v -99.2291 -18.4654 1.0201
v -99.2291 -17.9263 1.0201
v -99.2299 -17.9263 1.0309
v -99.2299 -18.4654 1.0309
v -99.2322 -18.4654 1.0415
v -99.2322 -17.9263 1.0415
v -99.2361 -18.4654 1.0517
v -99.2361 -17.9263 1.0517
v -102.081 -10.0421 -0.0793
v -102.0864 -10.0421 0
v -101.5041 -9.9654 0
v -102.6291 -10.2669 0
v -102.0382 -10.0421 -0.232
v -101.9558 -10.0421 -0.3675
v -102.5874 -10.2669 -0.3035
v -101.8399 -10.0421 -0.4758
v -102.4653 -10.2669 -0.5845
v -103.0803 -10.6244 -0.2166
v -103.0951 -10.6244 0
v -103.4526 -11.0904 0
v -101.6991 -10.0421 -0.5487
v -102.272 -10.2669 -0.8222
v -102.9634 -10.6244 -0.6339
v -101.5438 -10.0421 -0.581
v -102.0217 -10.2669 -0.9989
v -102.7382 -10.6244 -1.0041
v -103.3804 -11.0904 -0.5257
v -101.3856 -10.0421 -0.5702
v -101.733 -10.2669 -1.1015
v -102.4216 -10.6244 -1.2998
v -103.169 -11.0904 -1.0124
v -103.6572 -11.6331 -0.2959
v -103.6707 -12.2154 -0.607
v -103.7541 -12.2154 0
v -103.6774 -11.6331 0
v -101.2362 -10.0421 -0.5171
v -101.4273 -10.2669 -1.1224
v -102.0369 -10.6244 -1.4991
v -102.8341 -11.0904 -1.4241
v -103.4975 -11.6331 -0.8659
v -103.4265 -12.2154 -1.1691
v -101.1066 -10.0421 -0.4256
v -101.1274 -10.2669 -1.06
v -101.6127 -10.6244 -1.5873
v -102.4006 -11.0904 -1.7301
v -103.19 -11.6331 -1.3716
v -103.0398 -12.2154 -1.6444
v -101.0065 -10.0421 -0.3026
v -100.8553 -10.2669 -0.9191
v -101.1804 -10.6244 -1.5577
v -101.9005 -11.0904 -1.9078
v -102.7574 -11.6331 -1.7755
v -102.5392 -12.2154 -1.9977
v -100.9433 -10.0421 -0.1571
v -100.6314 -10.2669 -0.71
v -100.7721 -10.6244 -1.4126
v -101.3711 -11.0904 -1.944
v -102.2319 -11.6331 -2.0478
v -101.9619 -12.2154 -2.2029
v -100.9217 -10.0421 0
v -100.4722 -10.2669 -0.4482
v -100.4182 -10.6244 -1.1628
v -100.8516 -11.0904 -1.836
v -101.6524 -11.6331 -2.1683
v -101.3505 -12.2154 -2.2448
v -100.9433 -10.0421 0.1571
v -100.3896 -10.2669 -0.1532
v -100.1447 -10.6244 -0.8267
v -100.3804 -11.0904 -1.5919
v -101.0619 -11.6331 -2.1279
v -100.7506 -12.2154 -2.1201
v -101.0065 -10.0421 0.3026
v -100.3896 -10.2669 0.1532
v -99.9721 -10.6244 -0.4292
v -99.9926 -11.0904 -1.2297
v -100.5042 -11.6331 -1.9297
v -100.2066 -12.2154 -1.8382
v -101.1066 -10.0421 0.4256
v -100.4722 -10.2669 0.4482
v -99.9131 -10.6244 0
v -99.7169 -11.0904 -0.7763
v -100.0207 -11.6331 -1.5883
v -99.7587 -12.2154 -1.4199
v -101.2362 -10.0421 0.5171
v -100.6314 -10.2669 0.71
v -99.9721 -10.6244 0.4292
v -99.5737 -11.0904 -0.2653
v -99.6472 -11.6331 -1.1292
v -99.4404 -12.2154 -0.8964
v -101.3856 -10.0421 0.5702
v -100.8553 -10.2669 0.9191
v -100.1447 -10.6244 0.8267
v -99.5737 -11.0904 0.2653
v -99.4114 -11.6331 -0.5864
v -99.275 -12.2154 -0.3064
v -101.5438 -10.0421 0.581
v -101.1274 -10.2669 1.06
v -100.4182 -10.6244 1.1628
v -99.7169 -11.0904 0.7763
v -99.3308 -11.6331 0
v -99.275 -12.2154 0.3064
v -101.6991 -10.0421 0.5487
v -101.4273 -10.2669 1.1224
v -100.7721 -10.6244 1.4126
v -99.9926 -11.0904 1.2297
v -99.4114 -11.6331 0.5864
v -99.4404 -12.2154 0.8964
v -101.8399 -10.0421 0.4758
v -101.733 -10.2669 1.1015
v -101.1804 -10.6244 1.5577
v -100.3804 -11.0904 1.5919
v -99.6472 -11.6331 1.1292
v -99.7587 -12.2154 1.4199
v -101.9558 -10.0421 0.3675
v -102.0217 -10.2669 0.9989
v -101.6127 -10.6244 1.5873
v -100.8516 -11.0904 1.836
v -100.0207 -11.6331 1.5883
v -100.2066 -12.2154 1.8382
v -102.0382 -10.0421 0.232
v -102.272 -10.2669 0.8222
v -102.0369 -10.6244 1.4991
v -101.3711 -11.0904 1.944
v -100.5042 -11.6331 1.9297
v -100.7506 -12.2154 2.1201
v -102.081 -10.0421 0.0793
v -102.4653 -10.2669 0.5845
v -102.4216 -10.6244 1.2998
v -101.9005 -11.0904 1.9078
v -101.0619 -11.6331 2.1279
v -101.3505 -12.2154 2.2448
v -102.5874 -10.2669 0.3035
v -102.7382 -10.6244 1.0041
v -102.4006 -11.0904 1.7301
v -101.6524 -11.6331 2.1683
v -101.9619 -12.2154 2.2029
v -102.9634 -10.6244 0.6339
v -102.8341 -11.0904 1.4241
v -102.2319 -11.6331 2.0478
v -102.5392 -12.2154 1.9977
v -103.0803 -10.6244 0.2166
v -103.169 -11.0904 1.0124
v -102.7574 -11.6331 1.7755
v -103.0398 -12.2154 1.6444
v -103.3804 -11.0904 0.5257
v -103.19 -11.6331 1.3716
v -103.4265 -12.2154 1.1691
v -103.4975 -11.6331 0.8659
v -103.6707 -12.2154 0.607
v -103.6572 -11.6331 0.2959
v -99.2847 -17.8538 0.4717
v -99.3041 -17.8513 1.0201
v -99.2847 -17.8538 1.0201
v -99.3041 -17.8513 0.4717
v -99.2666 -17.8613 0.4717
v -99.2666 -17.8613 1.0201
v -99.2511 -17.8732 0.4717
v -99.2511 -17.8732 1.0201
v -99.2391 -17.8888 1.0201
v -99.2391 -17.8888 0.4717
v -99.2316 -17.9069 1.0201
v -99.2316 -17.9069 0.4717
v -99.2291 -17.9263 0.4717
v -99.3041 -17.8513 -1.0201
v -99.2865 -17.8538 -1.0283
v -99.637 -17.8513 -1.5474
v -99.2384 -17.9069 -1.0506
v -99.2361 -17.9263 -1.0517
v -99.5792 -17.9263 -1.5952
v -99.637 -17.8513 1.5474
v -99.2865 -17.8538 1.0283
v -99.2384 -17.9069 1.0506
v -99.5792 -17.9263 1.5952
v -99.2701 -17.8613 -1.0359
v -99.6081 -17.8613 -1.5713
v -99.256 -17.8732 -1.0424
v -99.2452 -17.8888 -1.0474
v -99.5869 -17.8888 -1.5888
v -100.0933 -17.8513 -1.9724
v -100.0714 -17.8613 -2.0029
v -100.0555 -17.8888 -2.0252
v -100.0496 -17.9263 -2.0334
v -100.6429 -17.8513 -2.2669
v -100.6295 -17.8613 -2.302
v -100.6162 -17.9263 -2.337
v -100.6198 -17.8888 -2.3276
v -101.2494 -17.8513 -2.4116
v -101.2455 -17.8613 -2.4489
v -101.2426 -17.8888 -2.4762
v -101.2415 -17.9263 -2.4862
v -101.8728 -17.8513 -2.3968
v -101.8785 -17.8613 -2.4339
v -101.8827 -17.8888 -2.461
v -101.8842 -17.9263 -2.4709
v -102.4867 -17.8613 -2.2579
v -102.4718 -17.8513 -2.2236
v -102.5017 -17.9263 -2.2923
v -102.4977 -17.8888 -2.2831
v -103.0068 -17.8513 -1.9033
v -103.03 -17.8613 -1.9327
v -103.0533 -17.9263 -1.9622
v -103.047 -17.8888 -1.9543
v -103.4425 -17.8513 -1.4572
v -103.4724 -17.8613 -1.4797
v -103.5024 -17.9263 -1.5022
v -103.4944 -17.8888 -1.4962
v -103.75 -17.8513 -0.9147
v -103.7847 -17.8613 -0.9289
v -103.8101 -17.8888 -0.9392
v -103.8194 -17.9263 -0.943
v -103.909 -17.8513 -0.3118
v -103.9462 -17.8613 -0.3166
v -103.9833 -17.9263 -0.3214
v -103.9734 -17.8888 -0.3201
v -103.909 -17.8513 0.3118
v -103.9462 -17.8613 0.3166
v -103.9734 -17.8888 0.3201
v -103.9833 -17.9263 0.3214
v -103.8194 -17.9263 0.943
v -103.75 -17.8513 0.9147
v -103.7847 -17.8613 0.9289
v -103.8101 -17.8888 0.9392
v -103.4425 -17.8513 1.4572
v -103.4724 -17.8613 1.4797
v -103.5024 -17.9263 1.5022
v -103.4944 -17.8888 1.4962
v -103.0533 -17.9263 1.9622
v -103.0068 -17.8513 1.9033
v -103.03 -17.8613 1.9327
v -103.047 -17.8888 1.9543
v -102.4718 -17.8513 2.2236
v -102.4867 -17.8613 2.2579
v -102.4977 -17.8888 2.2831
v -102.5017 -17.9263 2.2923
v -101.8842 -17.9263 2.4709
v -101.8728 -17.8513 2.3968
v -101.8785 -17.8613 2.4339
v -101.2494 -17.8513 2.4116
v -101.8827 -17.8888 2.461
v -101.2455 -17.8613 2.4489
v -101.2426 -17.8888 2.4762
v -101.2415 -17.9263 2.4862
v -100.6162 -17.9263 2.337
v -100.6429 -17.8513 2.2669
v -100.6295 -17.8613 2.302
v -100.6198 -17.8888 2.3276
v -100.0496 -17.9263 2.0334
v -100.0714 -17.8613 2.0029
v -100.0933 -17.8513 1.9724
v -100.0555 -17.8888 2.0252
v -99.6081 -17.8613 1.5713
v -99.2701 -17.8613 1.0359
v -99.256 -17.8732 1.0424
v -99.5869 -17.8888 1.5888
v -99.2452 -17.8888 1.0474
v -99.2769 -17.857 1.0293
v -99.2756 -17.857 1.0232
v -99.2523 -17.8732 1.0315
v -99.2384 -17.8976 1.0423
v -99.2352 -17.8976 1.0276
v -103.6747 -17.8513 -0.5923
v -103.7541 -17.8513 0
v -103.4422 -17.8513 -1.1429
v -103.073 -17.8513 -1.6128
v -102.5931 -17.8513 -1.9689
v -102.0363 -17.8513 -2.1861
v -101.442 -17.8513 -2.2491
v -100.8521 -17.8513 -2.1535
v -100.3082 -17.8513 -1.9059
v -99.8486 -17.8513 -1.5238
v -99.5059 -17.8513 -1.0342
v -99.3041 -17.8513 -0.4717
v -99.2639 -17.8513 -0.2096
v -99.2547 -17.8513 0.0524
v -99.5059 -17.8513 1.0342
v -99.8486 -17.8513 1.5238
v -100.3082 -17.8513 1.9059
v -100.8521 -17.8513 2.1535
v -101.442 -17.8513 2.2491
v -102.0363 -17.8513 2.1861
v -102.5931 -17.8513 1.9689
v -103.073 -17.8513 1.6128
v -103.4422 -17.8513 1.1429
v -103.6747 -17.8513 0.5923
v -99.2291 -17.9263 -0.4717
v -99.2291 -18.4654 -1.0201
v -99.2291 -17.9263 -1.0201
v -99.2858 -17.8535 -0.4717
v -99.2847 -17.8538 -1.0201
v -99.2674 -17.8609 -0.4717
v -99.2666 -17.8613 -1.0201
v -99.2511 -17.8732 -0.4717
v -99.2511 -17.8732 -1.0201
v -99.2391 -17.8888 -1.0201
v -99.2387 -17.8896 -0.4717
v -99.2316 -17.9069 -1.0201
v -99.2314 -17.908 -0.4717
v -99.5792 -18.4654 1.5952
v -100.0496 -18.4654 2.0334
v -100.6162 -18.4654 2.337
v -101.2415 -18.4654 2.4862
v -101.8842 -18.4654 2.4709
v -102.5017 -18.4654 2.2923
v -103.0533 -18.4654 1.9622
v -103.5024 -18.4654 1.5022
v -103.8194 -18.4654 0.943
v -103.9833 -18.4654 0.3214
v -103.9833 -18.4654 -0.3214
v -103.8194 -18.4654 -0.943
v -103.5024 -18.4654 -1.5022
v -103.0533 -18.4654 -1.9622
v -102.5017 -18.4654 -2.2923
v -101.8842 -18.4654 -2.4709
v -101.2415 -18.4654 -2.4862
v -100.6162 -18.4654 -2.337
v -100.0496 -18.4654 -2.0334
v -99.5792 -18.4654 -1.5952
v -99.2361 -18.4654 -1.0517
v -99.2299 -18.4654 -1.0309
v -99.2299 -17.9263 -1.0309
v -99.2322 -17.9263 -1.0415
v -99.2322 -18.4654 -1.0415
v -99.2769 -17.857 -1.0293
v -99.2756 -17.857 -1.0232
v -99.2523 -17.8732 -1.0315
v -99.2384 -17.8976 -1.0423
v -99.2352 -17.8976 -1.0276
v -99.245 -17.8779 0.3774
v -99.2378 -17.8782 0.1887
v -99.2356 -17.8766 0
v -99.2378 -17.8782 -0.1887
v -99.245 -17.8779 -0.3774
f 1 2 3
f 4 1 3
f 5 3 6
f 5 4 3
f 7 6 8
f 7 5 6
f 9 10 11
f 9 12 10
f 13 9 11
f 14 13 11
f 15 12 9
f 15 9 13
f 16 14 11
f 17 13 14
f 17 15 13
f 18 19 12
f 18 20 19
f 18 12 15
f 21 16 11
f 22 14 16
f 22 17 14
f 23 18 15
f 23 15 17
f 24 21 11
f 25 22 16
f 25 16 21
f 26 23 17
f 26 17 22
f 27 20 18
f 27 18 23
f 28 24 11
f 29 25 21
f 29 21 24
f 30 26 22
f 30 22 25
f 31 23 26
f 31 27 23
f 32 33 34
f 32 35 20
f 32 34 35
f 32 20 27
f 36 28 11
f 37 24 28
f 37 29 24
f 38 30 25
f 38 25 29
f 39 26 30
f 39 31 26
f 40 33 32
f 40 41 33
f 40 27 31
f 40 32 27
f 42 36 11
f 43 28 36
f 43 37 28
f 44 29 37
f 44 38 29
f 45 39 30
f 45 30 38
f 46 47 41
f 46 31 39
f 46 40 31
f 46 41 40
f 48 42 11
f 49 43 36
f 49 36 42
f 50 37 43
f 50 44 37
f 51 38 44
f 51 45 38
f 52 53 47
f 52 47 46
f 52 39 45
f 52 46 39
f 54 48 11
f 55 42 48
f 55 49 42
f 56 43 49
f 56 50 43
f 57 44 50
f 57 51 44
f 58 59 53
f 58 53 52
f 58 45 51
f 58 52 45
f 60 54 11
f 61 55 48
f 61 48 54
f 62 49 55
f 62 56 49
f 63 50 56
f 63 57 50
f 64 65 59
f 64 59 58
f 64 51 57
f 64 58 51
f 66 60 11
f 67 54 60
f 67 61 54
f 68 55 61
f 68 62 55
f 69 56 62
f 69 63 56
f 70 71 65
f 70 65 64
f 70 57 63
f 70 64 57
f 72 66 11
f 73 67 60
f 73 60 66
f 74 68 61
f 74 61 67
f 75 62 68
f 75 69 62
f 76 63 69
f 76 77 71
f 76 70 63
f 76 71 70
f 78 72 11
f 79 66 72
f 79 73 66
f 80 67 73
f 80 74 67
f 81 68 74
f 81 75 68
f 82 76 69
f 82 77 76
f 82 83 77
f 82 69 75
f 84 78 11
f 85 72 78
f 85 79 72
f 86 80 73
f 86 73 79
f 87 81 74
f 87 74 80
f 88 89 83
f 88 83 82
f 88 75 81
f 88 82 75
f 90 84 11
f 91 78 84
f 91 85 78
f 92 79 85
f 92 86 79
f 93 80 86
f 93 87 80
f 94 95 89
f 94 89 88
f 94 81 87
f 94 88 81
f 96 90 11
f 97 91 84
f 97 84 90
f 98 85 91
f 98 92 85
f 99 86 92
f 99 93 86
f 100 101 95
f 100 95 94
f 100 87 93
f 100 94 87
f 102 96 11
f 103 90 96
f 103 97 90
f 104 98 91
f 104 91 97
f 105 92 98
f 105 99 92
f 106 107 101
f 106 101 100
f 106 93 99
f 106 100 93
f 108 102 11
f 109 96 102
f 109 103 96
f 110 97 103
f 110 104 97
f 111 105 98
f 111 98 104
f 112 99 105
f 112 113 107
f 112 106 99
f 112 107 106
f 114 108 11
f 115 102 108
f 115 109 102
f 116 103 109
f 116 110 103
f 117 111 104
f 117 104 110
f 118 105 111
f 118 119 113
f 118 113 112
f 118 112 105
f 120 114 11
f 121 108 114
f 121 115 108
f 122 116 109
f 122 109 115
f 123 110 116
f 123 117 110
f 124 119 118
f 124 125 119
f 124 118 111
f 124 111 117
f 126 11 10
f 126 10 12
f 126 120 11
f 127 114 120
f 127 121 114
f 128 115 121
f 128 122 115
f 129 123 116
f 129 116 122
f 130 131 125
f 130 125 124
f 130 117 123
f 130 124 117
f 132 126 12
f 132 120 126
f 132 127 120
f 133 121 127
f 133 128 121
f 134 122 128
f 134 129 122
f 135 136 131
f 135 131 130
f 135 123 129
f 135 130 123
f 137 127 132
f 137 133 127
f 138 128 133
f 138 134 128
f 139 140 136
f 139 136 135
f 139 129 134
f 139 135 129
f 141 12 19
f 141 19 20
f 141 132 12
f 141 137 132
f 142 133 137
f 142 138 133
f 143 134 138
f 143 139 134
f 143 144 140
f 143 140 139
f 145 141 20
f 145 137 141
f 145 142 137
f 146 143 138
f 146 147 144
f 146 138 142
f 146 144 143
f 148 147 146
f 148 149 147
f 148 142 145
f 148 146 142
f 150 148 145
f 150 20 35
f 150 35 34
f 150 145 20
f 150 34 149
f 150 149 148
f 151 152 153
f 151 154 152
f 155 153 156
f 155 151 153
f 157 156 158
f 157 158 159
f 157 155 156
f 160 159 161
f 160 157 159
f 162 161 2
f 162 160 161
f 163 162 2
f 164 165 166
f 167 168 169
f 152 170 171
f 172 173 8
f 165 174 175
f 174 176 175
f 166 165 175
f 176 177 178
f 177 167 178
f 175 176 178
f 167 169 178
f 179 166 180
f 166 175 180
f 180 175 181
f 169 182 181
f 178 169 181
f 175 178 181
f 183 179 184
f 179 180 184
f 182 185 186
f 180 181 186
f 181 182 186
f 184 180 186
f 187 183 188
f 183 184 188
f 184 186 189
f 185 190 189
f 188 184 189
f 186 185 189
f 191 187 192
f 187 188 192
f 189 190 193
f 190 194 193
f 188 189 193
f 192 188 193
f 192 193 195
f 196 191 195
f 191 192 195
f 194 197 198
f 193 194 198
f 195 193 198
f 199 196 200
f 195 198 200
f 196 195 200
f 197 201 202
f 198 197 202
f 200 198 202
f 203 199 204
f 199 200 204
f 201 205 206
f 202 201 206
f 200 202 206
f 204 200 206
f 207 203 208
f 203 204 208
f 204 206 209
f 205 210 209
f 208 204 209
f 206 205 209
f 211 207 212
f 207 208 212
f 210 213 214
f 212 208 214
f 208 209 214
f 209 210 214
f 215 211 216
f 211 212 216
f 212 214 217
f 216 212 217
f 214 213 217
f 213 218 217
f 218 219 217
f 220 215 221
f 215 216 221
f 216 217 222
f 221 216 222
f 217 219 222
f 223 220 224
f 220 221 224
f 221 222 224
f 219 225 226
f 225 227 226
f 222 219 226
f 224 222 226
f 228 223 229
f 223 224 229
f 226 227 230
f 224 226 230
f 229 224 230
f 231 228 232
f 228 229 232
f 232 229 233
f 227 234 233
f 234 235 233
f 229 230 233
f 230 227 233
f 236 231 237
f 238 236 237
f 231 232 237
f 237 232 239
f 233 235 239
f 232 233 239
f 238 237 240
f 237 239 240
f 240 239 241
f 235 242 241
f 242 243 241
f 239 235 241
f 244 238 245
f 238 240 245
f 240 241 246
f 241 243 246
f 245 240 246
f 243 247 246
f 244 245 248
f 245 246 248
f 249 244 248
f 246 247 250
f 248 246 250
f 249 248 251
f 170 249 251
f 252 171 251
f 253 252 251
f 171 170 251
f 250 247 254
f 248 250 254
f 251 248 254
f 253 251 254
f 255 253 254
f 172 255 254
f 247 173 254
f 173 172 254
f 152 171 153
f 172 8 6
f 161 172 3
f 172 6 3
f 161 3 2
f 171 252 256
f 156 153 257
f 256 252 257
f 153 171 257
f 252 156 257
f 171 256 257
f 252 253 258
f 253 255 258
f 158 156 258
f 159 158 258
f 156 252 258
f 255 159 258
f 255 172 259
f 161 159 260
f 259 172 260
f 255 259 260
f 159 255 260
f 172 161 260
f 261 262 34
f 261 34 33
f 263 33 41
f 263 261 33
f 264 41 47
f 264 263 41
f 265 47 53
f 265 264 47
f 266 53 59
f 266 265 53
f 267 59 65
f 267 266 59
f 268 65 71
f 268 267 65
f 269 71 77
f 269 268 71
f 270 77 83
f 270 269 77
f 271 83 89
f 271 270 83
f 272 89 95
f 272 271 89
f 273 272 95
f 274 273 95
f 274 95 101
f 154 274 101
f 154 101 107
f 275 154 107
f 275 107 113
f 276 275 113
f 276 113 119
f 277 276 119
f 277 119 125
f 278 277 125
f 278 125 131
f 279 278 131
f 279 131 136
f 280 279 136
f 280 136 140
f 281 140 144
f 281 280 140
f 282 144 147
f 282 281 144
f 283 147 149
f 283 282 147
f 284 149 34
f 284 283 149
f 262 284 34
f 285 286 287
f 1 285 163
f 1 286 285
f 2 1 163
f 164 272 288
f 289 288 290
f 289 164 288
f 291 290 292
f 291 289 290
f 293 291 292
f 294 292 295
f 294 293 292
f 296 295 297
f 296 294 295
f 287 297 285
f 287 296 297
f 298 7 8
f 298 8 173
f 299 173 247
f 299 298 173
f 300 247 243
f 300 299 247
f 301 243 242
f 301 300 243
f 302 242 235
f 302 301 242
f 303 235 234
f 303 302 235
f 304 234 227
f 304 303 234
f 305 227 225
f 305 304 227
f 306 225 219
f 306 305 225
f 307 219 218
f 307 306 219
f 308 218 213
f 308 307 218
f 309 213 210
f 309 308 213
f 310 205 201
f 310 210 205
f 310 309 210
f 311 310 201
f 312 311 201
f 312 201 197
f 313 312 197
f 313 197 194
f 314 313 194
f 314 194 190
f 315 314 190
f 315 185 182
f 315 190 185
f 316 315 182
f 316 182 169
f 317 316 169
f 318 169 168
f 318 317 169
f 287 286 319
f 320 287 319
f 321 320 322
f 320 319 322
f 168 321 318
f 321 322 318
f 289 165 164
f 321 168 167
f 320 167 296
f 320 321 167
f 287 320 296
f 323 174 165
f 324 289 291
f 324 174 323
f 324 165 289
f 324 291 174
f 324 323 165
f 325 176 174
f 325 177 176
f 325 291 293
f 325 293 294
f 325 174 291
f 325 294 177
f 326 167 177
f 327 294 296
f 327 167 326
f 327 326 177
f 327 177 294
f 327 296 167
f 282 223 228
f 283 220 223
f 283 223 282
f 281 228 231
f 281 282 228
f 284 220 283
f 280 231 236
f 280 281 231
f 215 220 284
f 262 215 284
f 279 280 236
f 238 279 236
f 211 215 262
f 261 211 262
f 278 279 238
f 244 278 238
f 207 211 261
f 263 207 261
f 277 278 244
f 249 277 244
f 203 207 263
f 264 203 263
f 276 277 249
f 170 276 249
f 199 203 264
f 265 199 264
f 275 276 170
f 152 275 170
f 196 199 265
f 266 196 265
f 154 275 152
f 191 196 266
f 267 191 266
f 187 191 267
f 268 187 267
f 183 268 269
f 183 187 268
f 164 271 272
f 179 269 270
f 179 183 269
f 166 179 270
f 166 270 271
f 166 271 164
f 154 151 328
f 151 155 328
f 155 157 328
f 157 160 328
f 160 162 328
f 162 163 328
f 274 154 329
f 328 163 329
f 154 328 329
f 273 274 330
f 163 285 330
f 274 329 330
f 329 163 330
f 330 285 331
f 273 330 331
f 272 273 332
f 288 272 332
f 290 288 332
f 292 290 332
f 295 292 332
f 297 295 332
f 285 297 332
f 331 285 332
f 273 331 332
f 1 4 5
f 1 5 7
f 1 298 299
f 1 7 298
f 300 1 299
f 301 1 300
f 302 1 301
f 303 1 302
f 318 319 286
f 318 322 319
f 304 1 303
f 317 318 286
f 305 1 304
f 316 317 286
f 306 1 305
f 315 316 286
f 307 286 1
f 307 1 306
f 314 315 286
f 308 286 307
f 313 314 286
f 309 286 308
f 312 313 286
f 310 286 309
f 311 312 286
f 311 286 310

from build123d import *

# Parameters (mm, degrees)
F2_W     = 0.225
F2_H     = 0.6141559725
F3_DEPTH = 12.5
F4_R     = 0.075


with BuildPart() as f1:
    # F0 (on Top) → F1 (revolve)
    with BuildSketch(Plane.XY):
        with BuildLine():
            Line((-101.5040925145, -14.4654285704), (-101.5040925145, -9.9654285704))
            ThreePointArc((-101.5040925145, -9.9654285704), (-103.0950827722, -10.6244383127), (-103.7540925145, -12.2154285704))
            ThreePointArc((-103.7540925145, -12.2154285704), (-103.0950827722, -13.8064188281), (-101.5040925145, -14.4654285704))
        make_face()
        with BuildLine():
            Line((-101.5040925145, -17.8512725979), (-101.5040925145, -14.4654285704))
            ThreePointArc((-101.5040925145, -14.4654285704), (-103.0950827722, -13.8064188281), (-103.7540925145, -12.2154285704))
            Line((-103.7540925145, -12.2154285704), (-103.7540925145, -17.8512725979))
            Line((-103.7540925145, -17.8512725979), (-101.5040925145, -17.8512725979))
        make_face()
        Polygon((-101.5040925145, -18.4654285704), (-101.5040925145, -17.8512725979), (-103.7540925145, -17.8512725979), (-104.0040925145, -17.8512725979), (-104.0040925145, -18.4654285704), align=None)
    revolve(axis=Axis((-101.5040925145, -14.2154285704, 0), (0, -1, 0)))

    # F2 (on Top) → F3 (cut, symmetric)
    with BuildSketch(Plane.XY):
        with Locations((-99.1165925145, -18.1583505842)):
            Rectangle(F2_W, F2_H)
    extrude(amount=F3_DEPTH, both=True, mode=Mode.SUBTRACT)

    # F4
    f4_edges = [f1.edges().sort_by_distance(p)[0] for p in [
        (-104.004093, -17.851273, 0),
        (-99.229093, -17.851273, 0),
        (-99.229093, -18.158351, 1.036521),
        (-99.229093, -18.158351, -1.036521),
    ]]
    fillet(f4_edges, radius=F4_R)


solid = f1.part
